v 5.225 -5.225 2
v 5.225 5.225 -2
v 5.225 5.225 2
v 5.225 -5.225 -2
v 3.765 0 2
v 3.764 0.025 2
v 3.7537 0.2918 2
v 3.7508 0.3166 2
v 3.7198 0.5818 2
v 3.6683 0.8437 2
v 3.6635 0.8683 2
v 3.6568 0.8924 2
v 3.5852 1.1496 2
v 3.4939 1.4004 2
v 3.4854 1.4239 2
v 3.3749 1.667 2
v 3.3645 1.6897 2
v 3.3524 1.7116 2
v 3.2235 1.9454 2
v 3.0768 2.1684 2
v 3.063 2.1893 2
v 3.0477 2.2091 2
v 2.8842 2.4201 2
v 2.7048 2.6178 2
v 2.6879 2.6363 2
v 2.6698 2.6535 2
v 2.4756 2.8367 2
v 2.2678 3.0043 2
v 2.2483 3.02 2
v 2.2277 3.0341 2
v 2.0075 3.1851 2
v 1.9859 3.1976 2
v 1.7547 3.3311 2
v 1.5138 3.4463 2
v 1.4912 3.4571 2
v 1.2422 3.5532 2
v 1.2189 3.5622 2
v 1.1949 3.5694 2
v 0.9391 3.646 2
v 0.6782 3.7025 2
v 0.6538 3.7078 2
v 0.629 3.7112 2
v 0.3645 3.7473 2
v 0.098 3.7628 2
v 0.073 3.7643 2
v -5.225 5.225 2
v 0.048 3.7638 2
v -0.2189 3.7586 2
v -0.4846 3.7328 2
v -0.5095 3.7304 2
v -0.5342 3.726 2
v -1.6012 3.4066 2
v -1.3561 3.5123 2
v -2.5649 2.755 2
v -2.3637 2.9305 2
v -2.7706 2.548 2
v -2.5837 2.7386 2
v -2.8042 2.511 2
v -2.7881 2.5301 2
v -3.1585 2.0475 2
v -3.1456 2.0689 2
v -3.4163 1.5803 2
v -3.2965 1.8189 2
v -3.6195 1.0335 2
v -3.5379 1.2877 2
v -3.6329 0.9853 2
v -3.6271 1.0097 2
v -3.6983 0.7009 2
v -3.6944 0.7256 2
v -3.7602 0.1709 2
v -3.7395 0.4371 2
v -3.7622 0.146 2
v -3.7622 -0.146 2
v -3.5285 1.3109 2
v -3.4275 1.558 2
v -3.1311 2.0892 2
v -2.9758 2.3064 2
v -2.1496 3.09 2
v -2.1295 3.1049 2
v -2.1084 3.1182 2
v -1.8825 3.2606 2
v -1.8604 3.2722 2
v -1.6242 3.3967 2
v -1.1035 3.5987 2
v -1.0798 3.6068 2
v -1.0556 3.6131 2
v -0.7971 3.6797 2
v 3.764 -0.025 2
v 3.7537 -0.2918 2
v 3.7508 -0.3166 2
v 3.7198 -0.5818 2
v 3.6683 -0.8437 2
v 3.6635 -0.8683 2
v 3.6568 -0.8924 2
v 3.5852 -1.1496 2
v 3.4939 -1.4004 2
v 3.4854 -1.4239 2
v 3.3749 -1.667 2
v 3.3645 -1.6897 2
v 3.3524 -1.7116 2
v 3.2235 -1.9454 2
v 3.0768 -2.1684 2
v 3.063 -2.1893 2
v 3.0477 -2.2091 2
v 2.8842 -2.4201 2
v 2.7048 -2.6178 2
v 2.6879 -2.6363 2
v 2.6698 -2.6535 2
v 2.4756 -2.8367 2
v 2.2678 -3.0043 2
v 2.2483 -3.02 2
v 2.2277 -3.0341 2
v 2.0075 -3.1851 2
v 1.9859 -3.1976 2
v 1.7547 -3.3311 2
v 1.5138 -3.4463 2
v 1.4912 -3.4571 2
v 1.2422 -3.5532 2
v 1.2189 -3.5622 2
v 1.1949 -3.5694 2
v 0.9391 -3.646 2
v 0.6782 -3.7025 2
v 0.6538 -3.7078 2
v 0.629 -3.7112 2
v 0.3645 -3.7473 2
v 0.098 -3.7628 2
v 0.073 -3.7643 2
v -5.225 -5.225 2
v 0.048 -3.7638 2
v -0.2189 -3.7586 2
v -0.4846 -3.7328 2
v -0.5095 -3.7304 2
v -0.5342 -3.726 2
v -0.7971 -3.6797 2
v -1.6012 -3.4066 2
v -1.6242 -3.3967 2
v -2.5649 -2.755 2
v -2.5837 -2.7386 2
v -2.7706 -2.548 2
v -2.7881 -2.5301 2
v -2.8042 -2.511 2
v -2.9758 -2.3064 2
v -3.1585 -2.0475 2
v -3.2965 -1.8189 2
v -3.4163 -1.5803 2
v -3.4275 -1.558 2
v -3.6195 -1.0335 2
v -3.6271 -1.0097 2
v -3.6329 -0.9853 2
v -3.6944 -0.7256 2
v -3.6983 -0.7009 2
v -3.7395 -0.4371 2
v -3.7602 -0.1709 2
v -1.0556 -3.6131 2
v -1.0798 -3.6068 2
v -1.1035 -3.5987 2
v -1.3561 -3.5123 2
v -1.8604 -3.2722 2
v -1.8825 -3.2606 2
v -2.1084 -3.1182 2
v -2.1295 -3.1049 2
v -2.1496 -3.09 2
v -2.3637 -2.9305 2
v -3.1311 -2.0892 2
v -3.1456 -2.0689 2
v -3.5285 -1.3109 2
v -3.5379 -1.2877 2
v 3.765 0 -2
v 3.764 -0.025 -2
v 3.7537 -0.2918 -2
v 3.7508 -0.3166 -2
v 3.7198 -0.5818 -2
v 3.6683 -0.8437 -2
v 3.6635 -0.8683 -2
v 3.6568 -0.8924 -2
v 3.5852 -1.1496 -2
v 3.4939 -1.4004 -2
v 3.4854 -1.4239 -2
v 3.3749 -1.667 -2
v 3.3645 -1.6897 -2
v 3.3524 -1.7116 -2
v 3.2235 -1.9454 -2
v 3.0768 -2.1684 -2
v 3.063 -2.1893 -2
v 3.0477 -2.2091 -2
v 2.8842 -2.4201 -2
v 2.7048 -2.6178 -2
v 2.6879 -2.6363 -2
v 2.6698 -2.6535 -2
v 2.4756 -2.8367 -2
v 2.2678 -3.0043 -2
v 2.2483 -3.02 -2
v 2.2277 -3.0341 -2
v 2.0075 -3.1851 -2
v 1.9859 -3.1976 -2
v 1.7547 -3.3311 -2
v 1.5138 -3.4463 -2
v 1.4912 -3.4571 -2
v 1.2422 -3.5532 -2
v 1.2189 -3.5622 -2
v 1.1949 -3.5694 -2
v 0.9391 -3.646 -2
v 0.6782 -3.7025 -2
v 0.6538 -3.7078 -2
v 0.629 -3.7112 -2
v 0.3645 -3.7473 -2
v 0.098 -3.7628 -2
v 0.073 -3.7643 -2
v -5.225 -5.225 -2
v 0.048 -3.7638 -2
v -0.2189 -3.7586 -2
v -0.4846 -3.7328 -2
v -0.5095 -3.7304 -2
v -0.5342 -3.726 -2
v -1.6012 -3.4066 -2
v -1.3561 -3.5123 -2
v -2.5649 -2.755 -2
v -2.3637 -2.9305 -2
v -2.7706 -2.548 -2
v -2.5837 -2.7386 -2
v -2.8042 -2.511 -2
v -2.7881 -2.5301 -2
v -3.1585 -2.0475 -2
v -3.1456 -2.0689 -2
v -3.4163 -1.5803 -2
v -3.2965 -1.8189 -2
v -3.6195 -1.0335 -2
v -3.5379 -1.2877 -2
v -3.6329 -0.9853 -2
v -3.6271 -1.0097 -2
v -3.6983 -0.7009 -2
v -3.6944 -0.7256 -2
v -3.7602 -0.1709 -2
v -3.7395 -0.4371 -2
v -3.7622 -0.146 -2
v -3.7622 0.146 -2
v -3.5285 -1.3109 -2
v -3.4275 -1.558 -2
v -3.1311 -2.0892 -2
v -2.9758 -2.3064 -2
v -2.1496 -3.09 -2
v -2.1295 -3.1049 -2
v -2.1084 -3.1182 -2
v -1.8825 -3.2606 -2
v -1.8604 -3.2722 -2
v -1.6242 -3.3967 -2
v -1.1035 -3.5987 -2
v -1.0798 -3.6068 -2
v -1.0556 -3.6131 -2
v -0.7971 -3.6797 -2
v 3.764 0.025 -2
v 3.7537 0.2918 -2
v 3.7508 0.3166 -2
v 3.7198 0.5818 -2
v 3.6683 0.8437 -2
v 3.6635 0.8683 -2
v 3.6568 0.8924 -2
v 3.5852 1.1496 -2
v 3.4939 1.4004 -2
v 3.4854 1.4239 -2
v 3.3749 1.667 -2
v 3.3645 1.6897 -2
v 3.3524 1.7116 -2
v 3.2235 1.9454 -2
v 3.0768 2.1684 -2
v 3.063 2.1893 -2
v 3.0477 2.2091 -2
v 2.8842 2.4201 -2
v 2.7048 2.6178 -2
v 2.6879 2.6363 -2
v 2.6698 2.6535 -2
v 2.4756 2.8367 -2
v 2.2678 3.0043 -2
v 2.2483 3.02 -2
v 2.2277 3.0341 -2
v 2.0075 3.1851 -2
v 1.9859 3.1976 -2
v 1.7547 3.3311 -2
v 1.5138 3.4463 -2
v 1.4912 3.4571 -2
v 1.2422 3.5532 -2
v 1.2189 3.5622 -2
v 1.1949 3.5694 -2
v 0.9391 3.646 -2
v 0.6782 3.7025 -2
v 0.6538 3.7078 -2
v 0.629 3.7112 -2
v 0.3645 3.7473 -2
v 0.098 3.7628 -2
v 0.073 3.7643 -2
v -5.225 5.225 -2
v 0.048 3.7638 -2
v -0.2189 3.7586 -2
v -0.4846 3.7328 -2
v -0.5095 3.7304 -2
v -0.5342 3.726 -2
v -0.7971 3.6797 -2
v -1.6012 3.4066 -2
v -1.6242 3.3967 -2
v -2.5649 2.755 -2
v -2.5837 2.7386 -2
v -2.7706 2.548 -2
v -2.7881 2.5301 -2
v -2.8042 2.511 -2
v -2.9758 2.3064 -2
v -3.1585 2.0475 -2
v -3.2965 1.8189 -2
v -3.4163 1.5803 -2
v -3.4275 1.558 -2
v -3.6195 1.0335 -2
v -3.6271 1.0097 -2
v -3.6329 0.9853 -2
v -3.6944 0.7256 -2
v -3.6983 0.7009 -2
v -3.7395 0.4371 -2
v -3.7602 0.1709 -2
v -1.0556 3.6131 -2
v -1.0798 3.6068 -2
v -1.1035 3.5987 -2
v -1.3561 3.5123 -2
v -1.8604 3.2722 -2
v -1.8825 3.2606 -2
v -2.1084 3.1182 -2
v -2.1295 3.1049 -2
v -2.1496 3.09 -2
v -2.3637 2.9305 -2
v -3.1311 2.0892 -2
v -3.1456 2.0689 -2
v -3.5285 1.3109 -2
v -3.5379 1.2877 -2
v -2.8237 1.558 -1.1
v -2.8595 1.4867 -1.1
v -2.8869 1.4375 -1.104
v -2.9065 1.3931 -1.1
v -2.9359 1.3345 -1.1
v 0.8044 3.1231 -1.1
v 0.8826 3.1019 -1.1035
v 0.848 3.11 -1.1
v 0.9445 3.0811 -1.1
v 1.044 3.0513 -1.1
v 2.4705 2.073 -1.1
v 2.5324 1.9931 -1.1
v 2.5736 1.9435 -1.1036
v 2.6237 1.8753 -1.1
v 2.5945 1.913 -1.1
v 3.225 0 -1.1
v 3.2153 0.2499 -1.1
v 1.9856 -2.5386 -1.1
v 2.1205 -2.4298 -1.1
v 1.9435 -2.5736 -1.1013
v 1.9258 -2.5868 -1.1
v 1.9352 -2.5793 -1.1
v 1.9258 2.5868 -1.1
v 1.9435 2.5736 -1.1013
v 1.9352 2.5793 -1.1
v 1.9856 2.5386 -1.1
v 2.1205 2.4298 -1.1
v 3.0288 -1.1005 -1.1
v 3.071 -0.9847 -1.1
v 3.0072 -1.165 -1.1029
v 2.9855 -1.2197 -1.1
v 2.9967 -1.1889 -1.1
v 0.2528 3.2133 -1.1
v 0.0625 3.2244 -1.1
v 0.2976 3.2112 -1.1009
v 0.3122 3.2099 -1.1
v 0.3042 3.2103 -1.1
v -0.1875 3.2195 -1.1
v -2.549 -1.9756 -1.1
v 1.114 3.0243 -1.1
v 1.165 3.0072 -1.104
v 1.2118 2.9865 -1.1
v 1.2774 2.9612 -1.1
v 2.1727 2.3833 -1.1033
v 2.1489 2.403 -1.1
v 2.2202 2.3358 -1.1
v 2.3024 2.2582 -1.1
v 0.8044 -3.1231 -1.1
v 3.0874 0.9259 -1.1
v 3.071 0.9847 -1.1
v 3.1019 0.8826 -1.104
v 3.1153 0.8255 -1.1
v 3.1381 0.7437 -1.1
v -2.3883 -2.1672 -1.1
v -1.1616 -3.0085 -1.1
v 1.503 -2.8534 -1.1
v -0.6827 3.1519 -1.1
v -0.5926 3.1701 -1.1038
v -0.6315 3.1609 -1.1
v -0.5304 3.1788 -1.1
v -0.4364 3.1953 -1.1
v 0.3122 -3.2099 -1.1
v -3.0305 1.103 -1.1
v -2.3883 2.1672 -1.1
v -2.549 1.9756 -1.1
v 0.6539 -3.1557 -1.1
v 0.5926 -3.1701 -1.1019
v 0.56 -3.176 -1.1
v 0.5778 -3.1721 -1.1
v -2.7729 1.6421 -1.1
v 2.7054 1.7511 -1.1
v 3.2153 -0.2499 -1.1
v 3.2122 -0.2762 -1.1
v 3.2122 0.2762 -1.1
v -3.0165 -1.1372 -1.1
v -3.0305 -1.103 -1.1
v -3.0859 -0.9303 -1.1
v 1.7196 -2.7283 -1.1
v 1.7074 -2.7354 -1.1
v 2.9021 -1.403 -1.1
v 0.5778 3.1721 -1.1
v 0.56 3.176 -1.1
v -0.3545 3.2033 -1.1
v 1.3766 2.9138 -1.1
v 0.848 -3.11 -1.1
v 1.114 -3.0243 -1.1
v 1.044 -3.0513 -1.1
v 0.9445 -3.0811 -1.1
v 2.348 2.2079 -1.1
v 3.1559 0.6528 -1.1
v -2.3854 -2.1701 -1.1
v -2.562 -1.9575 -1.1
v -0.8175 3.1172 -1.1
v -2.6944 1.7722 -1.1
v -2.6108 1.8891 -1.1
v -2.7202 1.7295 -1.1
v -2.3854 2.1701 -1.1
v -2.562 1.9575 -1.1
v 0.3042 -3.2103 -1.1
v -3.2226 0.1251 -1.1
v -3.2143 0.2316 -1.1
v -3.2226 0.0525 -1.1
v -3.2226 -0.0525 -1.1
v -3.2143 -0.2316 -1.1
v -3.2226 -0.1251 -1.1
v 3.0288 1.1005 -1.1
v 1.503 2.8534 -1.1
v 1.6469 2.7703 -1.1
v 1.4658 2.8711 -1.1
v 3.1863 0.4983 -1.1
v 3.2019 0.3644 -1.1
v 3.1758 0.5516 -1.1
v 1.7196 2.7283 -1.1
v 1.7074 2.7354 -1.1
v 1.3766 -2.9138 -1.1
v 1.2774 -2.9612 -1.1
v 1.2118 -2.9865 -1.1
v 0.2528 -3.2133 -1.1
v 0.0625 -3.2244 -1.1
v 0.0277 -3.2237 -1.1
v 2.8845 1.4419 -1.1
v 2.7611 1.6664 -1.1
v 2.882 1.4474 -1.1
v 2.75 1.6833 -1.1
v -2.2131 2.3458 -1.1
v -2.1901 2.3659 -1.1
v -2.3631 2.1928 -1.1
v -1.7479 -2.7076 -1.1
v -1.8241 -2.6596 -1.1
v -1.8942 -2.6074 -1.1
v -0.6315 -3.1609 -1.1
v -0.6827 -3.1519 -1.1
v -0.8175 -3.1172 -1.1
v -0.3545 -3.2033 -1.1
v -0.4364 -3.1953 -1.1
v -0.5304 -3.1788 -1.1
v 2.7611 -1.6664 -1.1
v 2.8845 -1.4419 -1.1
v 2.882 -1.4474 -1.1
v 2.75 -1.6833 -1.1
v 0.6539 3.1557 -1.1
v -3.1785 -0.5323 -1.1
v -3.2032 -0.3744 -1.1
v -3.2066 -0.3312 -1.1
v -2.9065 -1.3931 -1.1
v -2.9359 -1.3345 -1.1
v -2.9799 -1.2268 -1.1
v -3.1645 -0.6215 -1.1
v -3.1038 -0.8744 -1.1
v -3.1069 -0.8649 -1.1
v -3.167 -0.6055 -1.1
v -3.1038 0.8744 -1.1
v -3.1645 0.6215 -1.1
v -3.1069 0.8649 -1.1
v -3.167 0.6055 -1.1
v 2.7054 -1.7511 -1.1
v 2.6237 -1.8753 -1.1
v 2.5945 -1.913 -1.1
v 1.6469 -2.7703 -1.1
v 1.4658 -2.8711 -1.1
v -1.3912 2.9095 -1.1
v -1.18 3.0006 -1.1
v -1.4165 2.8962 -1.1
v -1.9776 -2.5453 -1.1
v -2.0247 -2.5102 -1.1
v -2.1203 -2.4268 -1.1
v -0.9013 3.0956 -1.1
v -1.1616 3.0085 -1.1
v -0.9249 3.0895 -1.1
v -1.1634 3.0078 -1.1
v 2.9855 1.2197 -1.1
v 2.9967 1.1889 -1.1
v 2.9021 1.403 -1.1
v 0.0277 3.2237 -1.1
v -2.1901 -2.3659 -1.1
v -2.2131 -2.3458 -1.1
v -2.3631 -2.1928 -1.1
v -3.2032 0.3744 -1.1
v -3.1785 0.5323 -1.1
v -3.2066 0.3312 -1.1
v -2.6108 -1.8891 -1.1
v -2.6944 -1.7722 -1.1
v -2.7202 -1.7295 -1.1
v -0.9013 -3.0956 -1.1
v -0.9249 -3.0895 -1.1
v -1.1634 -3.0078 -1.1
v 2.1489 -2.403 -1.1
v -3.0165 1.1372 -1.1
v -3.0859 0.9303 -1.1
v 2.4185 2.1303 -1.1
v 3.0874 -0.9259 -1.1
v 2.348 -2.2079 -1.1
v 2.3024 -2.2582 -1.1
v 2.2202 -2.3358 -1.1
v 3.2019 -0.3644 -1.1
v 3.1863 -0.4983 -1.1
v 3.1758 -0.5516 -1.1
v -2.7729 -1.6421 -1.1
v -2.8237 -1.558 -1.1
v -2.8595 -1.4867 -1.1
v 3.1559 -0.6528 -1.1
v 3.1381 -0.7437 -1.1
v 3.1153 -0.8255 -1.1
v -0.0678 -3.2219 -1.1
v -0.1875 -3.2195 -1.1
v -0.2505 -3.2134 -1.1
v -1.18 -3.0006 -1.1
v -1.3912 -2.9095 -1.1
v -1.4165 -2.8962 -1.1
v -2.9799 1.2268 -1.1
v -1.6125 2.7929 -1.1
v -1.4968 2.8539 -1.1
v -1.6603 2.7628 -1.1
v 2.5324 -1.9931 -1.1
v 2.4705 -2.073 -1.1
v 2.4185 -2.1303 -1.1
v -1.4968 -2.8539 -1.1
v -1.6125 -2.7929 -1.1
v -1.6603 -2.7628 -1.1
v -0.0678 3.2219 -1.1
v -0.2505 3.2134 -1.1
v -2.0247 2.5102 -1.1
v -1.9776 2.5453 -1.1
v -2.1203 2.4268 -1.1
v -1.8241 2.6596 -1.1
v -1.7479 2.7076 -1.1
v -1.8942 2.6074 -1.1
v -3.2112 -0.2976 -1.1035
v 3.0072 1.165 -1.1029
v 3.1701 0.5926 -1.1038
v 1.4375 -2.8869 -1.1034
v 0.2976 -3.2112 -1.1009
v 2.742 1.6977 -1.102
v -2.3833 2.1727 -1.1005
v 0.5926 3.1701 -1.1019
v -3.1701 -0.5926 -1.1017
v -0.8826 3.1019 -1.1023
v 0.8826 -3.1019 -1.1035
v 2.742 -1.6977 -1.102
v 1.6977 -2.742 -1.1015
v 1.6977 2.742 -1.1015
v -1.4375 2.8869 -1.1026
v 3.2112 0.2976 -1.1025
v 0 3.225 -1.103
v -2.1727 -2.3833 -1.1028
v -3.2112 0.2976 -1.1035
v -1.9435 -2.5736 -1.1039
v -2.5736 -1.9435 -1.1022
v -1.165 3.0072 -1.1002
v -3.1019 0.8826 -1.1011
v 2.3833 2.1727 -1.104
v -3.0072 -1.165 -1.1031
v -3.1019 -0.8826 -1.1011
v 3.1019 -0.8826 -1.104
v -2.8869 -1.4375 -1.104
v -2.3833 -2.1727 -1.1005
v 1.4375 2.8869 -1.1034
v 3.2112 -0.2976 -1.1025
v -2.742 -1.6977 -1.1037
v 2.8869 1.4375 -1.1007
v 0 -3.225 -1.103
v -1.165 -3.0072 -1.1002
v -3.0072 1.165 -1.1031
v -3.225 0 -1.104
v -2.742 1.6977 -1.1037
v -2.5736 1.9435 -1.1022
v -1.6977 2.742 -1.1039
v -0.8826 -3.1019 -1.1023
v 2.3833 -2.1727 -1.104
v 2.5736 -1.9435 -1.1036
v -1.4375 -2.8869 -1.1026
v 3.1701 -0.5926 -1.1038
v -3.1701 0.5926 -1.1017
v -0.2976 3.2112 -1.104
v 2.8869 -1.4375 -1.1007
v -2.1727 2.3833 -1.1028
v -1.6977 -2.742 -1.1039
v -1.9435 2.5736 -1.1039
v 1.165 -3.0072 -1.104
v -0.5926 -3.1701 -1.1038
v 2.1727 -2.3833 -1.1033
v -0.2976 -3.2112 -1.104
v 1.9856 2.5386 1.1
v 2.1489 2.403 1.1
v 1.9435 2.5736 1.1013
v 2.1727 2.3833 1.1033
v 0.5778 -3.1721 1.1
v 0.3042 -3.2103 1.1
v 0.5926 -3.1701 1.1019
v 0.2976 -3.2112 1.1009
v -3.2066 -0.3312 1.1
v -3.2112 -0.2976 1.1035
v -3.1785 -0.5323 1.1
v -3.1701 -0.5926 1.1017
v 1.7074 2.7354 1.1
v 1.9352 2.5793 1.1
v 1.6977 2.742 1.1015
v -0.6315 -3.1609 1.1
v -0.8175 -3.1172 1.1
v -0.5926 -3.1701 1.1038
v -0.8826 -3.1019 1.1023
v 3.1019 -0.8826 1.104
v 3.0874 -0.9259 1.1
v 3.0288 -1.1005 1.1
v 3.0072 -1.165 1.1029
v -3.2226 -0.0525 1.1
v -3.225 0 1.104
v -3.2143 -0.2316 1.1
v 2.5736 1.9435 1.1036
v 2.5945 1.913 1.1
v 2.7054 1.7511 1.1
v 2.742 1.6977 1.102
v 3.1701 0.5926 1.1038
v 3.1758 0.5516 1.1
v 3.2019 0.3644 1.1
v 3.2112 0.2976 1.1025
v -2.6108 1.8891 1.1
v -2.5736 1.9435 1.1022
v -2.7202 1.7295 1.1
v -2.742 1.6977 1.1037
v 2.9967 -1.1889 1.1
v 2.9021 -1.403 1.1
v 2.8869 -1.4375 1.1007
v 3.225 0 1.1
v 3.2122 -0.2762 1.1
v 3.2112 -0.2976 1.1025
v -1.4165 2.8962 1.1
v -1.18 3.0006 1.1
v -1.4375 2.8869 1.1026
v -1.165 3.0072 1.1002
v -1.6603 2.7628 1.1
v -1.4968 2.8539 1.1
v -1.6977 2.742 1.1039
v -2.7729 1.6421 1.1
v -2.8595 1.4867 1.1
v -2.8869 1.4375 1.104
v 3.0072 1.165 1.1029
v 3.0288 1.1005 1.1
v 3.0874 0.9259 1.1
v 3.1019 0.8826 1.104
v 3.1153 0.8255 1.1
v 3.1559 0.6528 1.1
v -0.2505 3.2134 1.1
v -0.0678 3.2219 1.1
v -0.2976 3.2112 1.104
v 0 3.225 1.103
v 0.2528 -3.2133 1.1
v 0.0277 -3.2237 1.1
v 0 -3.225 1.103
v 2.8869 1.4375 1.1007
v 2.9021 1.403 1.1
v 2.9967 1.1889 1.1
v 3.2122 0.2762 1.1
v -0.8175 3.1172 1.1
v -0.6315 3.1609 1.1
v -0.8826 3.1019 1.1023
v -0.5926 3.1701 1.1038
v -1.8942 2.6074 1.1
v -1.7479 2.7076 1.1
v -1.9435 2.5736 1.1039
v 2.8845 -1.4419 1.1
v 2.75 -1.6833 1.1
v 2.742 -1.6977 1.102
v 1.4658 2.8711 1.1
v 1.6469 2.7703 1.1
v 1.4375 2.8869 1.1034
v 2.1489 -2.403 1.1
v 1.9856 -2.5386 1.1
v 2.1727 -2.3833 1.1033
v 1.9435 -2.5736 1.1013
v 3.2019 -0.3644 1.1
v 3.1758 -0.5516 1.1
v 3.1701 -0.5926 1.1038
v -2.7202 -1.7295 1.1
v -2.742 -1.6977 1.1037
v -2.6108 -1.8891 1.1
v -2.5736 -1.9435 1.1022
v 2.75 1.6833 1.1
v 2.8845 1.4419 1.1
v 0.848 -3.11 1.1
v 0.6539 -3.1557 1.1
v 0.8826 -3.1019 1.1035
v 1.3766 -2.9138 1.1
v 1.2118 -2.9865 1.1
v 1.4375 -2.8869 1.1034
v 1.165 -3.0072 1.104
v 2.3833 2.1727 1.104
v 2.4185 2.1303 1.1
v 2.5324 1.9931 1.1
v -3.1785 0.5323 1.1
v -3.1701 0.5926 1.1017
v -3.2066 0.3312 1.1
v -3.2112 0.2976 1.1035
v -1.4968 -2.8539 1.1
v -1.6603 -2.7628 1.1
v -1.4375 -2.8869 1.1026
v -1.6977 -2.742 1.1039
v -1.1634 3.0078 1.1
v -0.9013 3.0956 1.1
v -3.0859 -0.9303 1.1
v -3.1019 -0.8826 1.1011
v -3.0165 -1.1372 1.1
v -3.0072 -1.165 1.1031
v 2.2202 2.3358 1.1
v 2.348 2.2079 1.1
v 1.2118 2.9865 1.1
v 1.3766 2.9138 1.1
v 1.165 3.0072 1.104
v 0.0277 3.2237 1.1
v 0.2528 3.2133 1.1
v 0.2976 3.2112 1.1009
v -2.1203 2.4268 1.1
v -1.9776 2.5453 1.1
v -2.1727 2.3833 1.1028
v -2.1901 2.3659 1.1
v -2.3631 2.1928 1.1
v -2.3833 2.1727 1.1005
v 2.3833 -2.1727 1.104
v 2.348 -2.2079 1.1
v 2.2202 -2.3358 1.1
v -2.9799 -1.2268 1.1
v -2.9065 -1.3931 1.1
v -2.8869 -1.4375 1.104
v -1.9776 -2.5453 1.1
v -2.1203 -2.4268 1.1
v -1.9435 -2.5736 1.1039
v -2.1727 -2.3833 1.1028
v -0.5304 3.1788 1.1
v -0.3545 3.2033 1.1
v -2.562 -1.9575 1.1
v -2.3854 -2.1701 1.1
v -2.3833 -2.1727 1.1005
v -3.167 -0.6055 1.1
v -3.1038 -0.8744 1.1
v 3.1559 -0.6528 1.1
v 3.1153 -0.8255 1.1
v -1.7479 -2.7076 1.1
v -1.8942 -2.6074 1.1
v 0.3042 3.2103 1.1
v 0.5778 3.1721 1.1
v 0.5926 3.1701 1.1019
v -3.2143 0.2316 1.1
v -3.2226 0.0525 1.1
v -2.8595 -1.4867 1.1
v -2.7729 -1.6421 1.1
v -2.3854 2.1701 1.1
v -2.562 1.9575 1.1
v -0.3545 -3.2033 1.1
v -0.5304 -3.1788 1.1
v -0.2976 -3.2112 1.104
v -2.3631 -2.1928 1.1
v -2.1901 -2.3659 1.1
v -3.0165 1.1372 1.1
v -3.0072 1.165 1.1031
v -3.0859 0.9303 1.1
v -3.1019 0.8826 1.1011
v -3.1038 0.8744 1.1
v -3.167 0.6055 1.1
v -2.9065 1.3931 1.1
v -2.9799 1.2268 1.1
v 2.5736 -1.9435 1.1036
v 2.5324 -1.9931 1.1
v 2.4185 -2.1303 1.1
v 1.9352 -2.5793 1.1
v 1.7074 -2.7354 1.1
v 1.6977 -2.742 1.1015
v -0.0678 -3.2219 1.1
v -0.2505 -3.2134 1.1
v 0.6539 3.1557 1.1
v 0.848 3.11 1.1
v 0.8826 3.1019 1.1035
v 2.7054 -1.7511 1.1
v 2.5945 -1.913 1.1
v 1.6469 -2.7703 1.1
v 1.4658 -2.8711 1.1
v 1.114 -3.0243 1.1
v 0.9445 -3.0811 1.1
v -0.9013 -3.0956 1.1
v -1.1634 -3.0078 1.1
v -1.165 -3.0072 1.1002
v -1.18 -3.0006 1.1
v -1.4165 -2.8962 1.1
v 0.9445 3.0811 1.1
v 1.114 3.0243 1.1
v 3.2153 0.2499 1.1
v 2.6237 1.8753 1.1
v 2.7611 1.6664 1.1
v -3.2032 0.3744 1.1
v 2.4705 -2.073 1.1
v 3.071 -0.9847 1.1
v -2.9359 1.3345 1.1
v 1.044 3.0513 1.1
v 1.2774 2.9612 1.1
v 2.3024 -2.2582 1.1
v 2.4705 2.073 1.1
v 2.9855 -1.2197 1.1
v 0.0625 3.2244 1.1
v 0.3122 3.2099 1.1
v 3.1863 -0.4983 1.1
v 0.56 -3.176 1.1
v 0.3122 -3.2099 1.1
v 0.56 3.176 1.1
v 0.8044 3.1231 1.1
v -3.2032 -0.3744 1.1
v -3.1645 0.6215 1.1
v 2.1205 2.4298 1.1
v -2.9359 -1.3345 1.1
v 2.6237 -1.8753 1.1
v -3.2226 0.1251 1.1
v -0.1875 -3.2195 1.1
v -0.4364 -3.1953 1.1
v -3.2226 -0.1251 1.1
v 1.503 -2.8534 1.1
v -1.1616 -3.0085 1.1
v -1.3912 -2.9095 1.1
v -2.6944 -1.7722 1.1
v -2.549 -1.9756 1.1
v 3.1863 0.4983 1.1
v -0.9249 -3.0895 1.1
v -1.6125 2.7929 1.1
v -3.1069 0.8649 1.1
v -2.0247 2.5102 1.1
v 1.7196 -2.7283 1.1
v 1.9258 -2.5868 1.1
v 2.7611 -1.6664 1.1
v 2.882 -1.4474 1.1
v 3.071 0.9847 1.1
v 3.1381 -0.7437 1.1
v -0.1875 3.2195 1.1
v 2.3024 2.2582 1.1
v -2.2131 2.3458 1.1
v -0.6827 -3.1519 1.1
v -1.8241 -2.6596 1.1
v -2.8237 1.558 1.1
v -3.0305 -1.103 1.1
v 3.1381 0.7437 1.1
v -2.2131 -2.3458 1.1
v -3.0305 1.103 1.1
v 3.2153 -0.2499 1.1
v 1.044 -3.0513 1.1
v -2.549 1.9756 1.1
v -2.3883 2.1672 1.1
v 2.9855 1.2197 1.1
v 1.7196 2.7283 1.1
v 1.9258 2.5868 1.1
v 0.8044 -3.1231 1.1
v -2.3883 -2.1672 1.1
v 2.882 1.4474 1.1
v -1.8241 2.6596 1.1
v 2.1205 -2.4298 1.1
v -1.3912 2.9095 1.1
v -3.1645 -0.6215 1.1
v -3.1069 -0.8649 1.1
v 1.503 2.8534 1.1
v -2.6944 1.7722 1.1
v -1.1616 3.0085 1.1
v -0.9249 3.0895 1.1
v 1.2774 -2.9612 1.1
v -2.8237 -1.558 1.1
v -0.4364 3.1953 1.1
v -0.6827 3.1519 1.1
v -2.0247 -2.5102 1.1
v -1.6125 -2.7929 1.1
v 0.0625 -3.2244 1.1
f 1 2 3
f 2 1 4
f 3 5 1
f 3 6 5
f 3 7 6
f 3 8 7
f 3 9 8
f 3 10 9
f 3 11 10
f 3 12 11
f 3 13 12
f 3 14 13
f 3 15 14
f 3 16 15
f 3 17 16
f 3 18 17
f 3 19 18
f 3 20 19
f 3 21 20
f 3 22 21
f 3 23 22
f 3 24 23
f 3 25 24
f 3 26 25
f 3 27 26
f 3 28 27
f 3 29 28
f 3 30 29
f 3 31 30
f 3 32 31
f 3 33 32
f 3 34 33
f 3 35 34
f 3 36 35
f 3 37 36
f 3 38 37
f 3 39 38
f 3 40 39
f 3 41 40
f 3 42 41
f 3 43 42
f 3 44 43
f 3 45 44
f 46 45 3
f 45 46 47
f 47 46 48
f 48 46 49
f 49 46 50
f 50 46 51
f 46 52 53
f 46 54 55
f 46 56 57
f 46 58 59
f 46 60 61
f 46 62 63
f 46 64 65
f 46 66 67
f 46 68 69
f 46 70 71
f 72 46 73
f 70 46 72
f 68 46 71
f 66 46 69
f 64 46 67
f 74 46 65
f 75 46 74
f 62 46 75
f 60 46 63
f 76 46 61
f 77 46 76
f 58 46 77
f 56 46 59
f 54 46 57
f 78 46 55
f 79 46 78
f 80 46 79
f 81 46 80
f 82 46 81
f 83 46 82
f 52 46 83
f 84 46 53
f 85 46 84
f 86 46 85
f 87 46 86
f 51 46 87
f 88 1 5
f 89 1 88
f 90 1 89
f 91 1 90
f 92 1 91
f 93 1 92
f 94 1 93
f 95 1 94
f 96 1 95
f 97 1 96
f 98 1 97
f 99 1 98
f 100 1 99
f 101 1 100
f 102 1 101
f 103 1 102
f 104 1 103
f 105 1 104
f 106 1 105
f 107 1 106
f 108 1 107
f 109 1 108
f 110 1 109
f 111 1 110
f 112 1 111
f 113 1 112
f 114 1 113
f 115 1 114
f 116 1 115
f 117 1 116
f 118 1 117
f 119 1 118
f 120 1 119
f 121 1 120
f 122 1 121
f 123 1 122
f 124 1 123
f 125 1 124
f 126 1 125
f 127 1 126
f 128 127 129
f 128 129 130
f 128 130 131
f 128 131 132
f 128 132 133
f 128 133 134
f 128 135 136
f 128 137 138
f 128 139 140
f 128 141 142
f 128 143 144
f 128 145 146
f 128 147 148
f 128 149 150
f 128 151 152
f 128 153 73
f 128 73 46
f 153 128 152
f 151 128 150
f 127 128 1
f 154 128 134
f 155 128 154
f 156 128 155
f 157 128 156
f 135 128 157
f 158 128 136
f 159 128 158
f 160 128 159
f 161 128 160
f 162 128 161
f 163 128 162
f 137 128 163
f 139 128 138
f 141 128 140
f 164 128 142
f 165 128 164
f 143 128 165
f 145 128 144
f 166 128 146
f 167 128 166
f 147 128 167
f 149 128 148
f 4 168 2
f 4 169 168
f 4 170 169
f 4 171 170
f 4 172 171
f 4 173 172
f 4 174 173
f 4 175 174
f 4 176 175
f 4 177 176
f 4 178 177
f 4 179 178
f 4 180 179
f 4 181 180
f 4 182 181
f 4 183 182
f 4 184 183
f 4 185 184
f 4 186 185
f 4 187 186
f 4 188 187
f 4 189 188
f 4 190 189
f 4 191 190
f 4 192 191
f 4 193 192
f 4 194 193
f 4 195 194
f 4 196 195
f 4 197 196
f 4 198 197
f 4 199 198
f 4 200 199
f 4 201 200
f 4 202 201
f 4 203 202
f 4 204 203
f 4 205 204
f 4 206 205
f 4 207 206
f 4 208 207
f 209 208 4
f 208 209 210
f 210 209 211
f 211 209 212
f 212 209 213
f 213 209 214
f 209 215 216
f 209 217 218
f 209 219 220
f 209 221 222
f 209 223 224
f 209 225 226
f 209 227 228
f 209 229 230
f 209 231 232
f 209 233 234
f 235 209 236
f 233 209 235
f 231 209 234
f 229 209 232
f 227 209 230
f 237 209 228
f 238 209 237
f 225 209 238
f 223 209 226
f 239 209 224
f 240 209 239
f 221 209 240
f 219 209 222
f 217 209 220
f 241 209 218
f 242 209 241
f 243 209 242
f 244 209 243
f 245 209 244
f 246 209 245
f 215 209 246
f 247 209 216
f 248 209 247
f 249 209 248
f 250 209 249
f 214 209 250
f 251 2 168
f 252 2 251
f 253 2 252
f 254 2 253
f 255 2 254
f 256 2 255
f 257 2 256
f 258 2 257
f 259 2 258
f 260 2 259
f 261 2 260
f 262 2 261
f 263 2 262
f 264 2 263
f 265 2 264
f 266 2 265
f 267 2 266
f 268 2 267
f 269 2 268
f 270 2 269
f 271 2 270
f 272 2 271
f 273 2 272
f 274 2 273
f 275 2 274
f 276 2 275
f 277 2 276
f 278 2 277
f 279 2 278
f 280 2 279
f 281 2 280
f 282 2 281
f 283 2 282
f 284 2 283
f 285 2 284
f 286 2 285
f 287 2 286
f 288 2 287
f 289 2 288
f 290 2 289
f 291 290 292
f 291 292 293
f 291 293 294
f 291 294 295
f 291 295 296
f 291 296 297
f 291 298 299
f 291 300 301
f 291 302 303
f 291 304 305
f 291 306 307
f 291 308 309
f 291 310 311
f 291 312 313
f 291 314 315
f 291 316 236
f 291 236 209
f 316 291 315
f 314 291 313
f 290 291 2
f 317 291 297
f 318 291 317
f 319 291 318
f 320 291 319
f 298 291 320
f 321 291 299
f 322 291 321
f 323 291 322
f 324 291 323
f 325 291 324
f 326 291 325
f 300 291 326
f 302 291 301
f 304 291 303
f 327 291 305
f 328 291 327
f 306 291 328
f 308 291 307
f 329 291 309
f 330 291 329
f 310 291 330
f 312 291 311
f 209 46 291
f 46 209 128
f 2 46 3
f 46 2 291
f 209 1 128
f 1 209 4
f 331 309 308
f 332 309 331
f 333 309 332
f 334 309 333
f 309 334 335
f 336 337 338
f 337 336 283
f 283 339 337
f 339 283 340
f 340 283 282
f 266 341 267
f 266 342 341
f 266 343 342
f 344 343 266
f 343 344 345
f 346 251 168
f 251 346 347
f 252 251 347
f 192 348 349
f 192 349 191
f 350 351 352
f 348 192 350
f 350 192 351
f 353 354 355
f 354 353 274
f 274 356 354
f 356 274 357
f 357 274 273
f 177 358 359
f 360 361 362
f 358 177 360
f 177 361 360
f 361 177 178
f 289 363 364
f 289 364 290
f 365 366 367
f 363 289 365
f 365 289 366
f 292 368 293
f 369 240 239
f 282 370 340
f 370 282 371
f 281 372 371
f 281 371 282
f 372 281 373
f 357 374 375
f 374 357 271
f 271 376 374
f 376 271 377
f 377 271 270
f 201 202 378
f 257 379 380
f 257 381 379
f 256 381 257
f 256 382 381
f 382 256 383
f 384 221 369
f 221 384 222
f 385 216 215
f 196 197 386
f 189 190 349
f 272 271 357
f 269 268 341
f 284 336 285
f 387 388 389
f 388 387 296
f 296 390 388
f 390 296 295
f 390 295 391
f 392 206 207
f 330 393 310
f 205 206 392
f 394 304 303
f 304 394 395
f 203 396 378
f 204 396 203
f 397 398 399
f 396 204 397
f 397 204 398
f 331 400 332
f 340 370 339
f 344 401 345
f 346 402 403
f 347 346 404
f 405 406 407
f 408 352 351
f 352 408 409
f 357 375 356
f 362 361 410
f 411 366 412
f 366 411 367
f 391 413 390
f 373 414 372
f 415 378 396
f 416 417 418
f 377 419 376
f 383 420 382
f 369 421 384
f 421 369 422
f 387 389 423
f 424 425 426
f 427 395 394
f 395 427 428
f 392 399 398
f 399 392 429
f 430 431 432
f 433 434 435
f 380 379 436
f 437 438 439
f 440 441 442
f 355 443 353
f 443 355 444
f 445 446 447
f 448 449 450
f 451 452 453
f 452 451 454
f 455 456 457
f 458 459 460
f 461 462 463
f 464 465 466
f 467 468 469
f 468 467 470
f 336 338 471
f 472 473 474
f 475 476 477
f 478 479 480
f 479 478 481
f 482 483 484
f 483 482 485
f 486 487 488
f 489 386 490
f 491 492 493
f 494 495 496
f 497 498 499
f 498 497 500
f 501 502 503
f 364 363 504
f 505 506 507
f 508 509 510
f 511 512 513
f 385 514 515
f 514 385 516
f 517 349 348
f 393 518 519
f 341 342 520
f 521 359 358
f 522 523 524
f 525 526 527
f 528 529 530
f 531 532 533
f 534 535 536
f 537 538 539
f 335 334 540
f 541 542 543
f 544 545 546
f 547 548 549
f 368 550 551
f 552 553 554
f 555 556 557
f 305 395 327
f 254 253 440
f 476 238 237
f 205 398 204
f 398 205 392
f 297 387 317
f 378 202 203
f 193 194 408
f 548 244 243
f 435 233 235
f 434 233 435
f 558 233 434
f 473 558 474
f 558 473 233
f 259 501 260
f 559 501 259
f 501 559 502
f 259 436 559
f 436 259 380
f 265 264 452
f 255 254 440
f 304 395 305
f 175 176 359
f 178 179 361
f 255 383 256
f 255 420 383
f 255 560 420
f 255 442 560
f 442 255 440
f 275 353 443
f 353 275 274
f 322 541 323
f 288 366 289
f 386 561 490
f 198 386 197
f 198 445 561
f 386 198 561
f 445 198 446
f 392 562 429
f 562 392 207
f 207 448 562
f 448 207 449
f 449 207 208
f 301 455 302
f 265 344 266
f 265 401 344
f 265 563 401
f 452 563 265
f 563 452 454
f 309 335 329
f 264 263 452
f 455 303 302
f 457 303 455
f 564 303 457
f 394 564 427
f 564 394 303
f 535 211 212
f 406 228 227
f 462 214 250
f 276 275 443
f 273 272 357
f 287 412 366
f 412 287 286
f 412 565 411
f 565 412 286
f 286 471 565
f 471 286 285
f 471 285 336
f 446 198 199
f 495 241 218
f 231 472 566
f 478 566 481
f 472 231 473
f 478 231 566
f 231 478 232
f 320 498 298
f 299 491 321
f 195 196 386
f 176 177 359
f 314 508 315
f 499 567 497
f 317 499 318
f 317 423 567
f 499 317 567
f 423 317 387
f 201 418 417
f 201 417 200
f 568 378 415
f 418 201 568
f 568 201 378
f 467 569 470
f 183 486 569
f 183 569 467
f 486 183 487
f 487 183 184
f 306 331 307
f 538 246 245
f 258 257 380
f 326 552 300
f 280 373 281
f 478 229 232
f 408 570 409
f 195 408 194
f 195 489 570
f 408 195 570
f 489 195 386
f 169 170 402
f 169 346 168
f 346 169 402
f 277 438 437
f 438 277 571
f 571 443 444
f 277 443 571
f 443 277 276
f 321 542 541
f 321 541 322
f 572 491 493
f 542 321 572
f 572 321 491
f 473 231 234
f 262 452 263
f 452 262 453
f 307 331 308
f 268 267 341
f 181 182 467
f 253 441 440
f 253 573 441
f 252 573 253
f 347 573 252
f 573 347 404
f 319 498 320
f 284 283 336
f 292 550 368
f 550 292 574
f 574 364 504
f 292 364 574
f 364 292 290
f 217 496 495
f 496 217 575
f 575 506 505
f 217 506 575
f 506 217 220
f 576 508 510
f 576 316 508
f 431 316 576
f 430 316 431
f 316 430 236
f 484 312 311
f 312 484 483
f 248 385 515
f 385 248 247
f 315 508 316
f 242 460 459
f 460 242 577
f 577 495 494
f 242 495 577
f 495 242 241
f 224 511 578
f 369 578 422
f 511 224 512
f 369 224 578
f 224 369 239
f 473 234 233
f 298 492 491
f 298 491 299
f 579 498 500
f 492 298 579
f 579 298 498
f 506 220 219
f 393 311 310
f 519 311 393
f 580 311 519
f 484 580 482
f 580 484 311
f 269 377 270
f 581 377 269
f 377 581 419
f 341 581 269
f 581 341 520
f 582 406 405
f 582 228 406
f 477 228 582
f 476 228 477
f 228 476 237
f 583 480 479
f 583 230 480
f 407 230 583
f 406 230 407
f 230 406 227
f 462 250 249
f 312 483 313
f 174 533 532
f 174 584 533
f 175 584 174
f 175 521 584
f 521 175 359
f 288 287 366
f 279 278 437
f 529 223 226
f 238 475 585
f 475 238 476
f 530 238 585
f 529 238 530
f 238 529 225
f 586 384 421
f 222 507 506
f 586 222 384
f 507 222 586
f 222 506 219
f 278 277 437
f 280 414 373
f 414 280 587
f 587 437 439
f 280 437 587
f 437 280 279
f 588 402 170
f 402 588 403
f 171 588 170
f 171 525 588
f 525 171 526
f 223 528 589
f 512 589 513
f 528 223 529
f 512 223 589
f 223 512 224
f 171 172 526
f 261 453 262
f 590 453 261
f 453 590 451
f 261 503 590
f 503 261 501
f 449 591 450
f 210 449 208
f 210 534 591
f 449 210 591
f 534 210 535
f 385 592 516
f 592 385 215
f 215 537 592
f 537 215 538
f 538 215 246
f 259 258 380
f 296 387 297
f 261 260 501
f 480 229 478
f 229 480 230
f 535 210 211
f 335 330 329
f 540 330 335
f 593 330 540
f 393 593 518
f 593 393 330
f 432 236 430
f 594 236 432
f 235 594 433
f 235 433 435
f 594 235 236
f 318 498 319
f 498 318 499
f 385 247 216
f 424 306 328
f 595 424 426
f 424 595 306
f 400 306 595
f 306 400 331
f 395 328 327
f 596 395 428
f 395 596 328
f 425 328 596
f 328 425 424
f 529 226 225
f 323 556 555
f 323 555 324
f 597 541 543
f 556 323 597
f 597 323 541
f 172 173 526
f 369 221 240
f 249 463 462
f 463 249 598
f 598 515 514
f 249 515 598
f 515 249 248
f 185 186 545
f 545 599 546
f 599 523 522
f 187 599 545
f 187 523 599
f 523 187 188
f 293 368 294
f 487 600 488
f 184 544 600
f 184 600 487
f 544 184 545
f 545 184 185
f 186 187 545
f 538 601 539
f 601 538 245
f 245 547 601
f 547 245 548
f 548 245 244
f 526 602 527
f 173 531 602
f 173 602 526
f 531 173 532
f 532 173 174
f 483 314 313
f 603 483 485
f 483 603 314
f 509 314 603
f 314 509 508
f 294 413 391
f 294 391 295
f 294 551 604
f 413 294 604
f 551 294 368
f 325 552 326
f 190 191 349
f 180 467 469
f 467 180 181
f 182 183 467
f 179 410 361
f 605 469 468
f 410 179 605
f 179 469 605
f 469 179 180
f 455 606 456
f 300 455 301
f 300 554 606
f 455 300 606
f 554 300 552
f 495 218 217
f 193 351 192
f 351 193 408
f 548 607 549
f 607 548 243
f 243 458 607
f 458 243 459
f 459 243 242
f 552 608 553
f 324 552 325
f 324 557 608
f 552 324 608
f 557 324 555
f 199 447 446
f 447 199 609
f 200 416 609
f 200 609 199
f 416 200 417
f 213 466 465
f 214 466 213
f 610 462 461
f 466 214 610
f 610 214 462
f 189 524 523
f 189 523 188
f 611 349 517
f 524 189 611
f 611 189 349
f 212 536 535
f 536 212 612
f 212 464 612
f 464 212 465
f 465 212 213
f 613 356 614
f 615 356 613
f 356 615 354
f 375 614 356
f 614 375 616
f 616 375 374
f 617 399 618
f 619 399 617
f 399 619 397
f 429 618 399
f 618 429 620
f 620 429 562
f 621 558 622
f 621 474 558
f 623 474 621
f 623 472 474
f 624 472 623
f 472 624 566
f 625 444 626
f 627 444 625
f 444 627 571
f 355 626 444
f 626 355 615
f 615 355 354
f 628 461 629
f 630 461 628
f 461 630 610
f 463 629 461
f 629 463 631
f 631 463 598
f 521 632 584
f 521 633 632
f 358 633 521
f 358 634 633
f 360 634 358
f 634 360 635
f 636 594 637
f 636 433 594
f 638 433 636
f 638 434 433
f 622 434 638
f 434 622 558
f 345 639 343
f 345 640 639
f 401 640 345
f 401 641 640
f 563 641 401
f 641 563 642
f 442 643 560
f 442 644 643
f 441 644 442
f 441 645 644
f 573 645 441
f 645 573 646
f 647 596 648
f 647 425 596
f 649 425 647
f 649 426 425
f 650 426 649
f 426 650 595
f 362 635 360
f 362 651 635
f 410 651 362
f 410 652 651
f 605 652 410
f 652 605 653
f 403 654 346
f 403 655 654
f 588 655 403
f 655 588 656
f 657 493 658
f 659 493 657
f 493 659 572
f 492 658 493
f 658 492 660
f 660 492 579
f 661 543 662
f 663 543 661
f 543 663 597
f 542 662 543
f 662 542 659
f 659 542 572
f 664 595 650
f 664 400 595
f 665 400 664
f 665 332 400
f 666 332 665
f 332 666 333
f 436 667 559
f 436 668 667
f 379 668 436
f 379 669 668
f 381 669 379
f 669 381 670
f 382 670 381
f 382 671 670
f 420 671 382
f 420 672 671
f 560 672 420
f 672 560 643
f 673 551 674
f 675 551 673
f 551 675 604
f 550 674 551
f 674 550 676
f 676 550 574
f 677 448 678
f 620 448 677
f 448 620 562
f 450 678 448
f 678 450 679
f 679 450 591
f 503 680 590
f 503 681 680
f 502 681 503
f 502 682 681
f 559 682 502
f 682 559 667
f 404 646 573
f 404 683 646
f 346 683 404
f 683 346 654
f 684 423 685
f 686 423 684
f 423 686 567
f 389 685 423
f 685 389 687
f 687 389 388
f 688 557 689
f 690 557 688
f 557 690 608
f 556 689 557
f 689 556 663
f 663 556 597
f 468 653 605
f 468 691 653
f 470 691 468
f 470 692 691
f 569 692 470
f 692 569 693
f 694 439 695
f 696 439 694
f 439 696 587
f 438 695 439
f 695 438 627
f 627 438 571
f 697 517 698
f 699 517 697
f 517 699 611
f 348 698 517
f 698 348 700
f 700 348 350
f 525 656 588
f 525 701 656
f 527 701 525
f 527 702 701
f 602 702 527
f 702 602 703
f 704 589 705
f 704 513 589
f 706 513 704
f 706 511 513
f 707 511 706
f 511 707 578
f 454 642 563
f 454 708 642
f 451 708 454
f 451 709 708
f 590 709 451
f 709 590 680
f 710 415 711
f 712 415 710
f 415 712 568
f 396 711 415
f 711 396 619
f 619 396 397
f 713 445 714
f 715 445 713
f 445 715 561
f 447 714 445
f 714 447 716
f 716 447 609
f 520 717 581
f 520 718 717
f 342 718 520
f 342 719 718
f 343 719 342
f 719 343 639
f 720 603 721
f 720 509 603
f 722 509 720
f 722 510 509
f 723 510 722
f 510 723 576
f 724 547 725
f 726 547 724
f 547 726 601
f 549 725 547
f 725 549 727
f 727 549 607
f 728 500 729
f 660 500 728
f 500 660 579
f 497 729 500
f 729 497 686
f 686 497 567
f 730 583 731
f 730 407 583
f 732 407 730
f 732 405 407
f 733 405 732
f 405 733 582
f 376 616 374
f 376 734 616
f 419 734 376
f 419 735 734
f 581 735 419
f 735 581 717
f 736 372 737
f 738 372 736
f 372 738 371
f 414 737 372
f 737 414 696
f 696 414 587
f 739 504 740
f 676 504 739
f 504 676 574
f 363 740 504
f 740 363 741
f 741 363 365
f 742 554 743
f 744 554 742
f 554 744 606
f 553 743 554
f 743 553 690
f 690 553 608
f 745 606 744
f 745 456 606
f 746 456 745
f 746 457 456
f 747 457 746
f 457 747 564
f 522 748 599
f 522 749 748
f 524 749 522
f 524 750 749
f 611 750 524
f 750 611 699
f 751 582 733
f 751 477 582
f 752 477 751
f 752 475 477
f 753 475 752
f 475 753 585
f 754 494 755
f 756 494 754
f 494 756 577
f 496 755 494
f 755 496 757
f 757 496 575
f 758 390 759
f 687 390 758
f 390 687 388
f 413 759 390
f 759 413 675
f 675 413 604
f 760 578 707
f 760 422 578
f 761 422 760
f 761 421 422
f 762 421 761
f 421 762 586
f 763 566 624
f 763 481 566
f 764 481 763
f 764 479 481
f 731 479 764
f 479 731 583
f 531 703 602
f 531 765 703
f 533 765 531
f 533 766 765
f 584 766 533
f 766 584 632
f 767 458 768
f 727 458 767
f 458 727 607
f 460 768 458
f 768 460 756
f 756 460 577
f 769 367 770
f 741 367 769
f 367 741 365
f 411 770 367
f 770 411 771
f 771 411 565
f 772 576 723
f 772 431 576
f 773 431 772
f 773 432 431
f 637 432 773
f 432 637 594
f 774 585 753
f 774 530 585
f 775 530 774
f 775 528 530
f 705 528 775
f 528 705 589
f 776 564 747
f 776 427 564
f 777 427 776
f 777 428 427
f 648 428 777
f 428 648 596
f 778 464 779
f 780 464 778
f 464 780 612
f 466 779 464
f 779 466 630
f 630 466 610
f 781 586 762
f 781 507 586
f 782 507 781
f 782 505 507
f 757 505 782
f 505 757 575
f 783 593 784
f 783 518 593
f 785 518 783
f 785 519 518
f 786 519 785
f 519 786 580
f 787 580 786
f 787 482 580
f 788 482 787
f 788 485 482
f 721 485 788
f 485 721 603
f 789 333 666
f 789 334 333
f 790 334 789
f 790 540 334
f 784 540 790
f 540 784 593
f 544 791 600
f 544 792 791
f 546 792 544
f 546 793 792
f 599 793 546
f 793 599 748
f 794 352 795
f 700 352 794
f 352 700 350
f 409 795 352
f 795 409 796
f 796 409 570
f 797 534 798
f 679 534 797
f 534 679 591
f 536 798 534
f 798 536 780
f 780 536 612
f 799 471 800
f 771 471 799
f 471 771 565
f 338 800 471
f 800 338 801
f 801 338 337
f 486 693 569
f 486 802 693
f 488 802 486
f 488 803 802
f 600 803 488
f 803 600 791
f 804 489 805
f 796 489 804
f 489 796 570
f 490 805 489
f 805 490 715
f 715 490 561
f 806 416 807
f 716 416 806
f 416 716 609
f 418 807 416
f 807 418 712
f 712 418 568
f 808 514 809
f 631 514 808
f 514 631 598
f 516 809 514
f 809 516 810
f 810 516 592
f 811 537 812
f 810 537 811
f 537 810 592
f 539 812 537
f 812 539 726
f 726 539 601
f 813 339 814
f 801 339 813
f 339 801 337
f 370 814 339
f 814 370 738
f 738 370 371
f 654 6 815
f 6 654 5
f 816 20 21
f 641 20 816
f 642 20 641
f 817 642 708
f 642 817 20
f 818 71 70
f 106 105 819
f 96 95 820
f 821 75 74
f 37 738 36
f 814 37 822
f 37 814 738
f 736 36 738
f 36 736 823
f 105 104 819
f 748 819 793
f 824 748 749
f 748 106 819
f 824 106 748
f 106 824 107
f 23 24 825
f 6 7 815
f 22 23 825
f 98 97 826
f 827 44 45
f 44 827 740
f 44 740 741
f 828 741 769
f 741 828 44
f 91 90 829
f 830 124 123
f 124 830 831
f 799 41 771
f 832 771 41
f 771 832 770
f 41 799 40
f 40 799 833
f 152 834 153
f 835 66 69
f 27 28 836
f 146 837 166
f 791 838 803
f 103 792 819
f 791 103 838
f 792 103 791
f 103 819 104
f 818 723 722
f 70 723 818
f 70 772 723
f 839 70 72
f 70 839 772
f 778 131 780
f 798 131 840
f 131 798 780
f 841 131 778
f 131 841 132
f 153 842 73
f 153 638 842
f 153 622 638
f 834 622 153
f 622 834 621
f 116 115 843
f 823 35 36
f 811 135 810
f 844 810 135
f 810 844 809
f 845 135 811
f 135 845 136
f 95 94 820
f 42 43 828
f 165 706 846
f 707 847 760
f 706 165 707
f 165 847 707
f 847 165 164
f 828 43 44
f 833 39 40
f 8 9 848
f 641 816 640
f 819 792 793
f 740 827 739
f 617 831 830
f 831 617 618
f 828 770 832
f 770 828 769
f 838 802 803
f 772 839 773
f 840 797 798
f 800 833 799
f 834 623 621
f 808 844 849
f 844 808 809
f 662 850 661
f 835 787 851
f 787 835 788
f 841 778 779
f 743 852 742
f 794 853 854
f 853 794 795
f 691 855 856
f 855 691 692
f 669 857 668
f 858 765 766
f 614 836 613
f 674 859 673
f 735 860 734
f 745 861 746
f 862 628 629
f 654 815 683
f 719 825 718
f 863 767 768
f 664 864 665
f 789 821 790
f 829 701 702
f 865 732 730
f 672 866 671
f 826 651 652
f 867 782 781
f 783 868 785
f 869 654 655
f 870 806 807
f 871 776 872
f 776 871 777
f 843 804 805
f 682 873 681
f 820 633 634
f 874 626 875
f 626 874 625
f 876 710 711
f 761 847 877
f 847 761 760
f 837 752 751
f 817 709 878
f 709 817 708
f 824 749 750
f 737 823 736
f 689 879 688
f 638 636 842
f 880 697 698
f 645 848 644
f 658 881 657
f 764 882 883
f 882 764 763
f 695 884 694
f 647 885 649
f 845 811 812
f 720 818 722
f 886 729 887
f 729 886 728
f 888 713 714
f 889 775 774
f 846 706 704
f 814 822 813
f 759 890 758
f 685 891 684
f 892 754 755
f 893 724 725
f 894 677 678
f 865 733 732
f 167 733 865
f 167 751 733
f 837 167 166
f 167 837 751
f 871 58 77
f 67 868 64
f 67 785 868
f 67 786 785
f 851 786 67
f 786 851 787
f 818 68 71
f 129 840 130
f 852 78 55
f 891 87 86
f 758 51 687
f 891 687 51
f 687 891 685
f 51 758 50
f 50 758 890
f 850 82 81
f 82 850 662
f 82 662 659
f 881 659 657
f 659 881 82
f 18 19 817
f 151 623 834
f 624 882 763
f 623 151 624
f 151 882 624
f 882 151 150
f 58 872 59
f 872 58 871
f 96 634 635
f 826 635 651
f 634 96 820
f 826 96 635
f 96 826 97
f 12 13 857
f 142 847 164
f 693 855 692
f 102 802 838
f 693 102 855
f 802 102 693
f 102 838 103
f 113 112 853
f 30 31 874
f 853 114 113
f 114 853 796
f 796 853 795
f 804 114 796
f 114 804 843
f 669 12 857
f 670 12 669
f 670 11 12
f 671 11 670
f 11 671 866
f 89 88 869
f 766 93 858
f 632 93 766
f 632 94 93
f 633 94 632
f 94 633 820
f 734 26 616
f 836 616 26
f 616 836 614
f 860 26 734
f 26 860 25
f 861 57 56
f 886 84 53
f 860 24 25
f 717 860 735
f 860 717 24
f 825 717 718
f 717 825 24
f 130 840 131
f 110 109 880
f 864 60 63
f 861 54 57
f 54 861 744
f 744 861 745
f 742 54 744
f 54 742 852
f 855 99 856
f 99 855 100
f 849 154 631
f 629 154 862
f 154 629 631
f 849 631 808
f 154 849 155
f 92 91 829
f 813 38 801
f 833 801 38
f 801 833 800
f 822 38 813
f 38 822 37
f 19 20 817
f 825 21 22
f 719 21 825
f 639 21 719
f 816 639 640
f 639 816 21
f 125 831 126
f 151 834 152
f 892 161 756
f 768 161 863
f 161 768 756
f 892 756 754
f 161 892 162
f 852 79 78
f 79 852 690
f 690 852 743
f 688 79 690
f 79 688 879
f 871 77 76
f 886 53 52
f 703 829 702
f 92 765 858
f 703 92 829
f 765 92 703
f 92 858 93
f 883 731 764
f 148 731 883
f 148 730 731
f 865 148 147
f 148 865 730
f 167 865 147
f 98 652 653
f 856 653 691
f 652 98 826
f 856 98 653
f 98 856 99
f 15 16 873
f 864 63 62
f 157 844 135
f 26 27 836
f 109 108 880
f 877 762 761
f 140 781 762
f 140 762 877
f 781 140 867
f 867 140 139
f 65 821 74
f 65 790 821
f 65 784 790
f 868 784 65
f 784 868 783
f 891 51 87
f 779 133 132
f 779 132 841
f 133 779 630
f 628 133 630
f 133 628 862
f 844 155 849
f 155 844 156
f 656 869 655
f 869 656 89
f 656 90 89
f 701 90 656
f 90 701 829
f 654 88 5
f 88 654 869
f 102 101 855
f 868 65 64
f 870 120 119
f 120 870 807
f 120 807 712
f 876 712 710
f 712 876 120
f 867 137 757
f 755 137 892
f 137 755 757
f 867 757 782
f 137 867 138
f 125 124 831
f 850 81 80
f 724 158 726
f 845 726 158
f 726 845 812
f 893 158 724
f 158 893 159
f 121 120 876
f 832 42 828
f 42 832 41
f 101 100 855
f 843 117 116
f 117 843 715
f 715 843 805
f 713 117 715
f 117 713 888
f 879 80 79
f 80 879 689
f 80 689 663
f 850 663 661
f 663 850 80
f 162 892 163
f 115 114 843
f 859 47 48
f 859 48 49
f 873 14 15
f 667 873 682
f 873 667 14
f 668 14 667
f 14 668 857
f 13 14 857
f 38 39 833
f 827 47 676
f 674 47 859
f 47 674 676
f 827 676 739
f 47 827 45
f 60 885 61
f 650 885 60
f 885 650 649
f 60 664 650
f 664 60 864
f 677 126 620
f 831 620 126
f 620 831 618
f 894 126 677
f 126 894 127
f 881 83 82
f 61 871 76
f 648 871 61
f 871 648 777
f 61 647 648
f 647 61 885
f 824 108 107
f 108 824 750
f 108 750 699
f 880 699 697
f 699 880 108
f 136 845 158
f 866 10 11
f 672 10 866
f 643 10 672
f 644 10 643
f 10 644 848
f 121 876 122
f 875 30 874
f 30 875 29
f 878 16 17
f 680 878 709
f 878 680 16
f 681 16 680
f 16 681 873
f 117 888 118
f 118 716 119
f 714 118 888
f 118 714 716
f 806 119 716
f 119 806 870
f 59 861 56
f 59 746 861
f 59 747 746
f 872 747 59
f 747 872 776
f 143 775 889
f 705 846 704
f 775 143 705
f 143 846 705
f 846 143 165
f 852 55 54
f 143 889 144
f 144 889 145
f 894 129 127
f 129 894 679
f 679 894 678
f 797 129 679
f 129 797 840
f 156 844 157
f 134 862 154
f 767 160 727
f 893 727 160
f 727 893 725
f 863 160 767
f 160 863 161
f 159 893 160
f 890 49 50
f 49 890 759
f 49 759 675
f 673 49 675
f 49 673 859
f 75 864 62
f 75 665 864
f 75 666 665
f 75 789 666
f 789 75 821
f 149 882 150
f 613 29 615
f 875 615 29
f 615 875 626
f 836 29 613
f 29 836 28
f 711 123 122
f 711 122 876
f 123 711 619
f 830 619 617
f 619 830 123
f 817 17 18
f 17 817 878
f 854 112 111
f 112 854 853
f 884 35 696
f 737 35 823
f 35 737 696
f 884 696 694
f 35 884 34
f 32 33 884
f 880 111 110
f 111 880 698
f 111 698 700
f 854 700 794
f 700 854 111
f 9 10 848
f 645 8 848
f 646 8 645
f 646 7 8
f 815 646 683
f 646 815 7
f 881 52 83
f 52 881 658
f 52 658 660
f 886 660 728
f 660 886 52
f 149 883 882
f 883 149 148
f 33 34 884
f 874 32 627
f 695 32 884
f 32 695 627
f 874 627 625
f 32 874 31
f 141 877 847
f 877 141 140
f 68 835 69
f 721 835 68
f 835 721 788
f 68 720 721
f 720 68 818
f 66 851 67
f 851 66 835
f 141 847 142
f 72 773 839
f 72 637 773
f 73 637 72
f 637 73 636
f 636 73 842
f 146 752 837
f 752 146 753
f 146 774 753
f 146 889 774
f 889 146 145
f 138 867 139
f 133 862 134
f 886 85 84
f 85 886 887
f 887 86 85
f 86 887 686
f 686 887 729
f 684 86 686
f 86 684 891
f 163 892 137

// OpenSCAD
//tapered hole for testing ultimaker PLA shrinkage
$fa=0.3;
$fs=0.3;
//Diameter of the hole
hole_diameter=6.45;//[6.3,6.35,6.4,6.45,6.5,6.55]
//Distance from the cube walls to the edge of the hole
x_axis_offest=4;//[2,4]
//Height of the part
hole_height=4;//[2,3,4,5]
//Tamper height
hole_taper=1;//[0.6,1,1.2]
test_hole(diameter=hole_diameter,xoffset=x_axis_offest,height=hole_height,taper=hole_taper);

module test_hole(diameter,xoffset,height,taper)
difference(){
    cube([diameter+xoffset,diameter+xoffset,height],center=true);
    translate([0,0,-(height/2+.1)])
    cylinder(d1=diameter+1.2,d2=diameter,h=taper);
    cylinder(d=diameter,h=height+xoffset/2,center=true);
     translate([0,0,height/2+.1-taper])
    cylinder(d1=diameter,d2=diameter+1.2,h=taper);
}
